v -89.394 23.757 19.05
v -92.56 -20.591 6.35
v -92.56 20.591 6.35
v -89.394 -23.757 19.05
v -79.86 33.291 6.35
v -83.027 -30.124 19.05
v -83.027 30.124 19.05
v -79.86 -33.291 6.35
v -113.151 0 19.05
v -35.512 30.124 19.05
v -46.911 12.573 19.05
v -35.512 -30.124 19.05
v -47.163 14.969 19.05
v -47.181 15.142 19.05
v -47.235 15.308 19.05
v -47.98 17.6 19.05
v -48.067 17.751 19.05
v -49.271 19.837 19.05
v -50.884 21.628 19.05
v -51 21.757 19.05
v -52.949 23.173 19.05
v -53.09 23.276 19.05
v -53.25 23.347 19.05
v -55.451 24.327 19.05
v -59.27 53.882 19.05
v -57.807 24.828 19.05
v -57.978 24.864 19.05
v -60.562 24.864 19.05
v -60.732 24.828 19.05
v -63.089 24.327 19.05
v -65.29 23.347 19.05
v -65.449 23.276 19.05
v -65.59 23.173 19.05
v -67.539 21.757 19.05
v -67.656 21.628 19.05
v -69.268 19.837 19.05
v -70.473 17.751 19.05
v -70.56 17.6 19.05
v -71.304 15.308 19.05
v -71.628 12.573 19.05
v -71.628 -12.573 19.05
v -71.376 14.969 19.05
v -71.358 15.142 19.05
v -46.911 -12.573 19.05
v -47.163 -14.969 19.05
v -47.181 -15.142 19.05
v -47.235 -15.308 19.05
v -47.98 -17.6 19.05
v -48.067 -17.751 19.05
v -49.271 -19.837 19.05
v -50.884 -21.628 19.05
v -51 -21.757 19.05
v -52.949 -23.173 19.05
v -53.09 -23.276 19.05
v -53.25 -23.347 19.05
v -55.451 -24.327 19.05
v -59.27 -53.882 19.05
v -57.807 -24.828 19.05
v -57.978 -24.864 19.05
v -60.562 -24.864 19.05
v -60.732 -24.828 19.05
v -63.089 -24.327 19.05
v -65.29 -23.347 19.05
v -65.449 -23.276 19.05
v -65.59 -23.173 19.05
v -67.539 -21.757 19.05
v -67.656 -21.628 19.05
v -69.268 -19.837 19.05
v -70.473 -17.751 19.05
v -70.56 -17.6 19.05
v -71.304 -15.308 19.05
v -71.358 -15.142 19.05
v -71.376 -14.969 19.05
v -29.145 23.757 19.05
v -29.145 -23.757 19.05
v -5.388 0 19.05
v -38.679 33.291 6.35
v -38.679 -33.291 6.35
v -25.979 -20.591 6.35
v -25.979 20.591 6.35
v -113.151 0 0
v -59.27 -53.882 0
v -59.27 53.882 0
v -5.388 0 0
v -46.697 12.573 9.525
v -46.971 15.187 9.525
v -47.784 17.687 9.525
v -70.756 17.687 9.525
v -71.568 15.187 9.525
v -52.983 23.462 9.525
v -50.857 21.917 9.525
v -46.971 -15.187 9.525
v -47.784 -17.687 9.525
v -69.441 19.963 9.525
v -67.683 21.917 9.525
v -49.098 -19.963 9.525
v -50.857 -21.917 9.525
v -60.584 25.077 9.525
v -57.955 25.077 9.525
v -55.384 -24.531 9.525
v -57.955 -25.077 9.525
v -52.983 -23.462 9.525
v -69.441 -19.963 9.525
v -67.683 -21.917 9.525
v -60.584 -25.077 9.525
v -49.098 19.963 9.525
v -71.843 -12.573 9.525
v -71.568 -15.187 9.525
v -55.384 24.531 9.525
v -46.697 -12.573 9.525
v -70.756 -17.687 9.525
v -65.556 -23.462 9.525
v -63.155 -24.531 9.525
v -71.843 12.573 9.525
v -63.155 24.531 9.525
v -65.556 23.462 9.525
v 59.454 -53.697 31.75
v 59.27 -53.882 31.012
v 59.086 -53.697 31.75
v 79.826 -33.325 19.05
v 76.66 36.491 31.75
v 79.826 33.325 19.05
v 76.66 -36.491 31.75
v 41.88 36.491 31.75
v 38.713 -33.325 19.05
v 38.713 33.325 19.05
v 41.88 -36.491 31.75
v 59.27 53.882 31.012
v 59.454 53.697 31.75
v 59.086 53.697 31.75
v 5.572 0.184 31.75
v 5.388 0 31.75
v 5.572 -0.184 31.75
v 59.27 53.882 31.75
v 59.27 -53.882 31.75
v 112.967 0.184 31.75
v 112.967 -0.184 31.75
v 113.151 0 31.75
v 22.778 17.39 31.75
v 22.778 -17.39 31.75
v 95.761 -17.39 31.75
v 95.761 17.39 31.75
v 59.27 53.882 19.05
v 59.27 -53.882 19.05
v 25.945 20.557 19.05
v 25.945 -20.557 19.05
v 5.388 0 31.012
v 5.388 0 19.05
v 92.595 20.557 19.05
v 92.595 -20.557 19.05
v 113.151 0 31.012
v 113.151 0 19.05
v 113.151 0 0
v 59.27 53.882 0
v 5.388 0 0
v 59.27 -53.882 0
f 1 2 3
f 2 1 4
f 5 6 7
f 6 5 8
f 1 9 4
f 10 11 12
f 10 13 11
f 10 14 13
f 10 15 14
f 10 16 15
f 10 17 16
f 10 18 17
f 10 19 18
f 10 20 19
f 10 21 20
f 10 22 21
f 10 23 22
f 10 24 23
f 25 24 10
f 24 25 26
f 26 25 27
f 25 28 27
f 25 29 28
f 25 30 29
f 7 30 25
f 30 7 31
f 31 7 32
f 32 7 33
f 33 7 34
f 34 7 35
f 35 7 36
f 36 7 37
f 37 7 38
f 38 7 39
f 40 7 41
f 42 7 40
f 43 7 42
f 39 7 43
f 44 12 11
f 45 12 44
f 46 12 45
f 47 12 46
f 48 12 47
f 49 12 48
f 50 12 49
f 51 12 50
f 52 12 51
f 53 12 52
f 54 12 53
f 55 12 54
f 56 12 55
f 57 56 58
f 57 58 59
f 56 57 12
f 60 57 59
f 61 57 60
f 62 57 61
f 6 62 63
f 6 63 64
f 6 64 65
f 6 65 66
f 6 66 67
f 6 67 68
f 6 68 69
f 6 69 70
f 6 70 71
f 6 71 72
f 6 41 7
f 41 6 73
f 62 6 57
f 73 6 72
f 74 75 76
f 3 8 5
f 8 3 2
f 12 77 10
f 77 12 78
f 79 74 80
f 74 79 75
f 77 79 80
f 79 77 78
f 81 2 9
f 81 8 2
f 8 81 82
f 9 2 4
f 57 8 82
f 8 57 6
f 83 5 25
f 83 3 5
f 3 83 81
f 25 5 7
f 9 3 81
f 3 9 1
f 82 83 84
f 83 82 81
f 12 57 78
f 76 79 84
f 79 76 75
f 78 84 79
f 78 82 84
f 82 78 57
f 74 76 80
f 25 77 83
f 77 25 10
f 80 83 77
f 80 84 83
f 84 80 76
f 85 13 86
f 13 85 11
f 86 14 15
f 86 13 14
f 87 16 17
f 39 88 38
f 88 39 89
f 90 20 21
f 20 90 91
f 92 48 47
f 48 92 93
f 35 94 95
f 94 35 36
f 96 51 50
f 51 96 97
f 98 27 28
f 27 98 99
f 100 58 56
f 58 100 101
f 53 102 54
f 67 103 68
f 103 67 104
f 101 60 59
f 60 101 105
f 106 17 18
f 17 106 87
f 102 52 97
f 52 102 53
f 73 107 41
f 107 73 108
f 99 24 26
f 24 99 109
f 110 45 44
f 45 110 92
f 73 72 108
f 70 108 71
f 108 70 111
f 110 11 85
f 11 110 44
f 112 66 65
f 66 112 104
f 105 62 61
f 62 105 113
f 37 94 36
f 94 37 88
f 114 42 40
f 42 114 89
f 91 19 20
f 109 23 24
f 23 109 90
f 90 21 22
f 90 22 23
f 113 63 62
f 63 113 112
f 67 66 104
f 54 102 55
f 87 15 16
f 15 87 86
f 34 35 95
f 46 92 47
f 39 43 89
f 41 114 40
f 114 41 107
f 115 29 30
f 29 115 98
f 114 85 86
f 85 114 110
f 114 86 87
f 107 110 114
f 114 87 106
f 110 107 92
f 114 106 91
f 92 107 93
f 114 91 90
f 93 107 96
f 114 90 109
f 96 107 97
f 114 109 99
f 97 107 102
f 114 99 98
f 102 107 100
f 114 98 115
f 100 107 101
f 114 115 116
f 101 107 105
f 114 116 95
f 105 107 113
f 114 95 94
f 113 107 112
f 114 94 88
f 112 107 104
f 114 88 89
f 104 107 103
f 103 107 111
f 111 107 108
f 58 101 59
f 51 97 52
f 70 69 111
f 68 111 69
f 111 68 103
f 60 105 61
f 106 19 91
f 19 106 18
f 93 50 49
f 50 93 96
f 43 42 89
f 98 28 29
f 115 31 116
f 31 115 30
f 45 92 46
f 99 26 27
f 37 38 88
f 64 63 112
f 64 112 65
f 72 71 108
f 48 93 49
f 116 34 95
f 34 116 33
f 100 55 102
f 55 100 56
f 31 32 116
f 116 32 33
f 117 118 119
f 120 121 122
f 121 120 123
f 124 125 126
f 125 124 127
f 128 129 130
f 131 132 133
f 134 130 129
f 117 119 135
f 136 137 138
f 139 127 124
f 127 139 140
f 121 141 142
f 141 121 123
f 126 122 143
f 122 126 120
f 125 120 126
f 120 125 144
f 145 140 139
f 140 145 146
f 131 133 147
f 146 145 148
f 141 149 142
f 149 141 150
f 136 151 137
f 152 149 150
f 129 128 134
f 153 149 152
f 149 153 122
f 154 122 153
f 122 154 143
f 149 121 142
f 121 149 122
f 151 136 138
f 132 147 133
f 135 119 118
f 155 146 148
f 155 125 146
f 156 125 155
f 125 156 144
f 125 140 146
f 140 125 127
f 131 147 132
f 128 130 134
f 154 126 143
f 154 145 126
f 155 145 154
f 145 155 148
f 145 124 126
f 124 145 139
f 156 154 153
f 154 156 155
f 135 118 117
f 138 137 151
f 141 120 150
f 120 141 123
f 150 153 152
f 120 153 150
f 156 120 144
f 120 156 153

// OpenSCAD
//!OpenSCAD

Height = 1.5;
Width_and_Depth = 3;
Number_of_Tails = 1;
Units = 25.4;
Dovetail_Angle = 14;
Dovetail_Height = 0.5;
Dovetail_Diameter = 0.5;
Box_Proportion = 0.5;
Hole_Proportion = 0.33;
Generate_DXF_or_STL = "STL"; // [DXF, STL]
Open_or_Closed = "Open"; // [Open, Closed]

module makebottom() {
  difference() {
    translate([0, 0, ((ht * Box_Proportion) / 2)]){
      rotate([0, 0, 45]){
        cube([wd, wd, (ht * Box_Proportion)], center=true);
      }
    }

    cutbottomdovetails();
    cutpocket();
  }
}

ht = Height * Units;
wd = Width_and_Depth * Units;
dh = Dovetail_Height * Units;
dr = (Dovetail_Diameter * Units) / 2;
do = tan(Dovetail_Angle) * dh;
sd = dr - do;
rwidth = sqrt(wd * wd + wd * wd);
rwidthhalf = rwidth / 2;
rwidthquarter = rwidth / 4;
//item = 0;


module cutbottomdovetails() {
  union(){
    cutdovetails(-rwidthquarter, -(rwidthquarter * 1.5), ht * Box_Proportion - dh, -rwidthquarter, rwidthquarter * 1.5, ht * Box_Proportion - dh);
    cutdovetails(rwidthquarter, -(rwidthquarter * 1.5), ht * Box_Proportion - dh, rwidthquarter, rwidthquarter * 1.5, ht * Box_Proportion - dh);
  }
}

module cutdovetails(bx, by, bz, ex, ey, ez) {
  hull(){
    translate([bx, by, bz]){
      dovetail();
    }
    translate([ex, ey, ez]){
      dovetail();
    }
  }
}

module maketop() {
  color([0.6,0.4,0.2]) {
    difference() {
      translate([0, 0, (((ht - ht * Box_Proportion) + dh) / 2)]){
        rotate([0, 0, 45]){
          cube([wd, wd, ((ht - ht * Box_Proportion) + dh)], center=true);
        }
      }

      cuttopdovetails();
    }
  }
}

module cuttopdovetails() {
  union(){
    hull(){
      cutdovetails(-(rwidthquarter - sd * 4), -(rwidthquarter * 1.875), ht * Box_Proportion, -(rwidthquarter - sd * 4), rwidthquarter * 1.875, ht * Box_Proportion);
      cutdovetails(rwidthquarter - sd * 4, -(rwidthquarter * 1.875), ht * Box_Proportion, rwidthquarter - sd * 4, rwidthquarter * 1.875, ht * Box_Proportion);
    }
    hull(){
      cutdovetails(-(rwidthquarter + sd * 4), -rwidthquarter, ht * Box_Proportion, -(rwidthquarter + sd * 4), rwidthquarter, ht * Box_Proportion);
      cutdovetails(-(rwidthquarter * 1.875), -rwidthquarter, ht * Box_Proportion, -(rwidthquarter * 1.875), rwidthquarter, ht * Box_Proportion);
    }
    hull(){
      cutdovetails(rwidthquarter + sd * 4, -rwidthquarter, ht * Box_Proportion, rwidthquarter + sd * 4, rwidthquarter, ht * Box_Proportion);
      cutdovetails(rwidthquarter * 1.875, -rwidthquarter, ht * Box_Proportion, rwidthquarter * 1.875, rwidthquarter, ht * Box_Proportion);
    }
  }
}

module cutpocket() {
  hull(){
    translate([0, ((wd * Hole_Proportion) / 2), (ht / 4)]){
      cylinder(r1=((wd * Hole_Proportion) / 2), r2=10, h=(ht * 3), center=false);
    }
    translate([0, (-((wd * Hole_Proportion) / 2)), (ht / 4)]){
      cylinder(r1=((wd * Hole_Proportion) / 2), r2=10, h=(ht * 3), center=false);
    }
  }
}

module dovetail() {
  if (Generate_DXF_or_STL == "STL") {
    union(){
      cylinder(r1=dr, r2=(dr - do), h=dh, center=false);
    }
  } else {
    translate([0, 0, (-ht)]){
      cylinder(r1=(dr - do), r2=(dr - do), h=(ht * 3), center=false);
    }
  }

}

if (Generate_DXF_or_STL == "STL") {
  if (Open_or_Closed == "Open") {
    union(){
      translate([(-(rwidthhalf * 1.1)), 0, 0]){
        makebottom();
      }
      translate([(rwidthhalf * 1.1), 0, 0]){
        maketop();
      }
    }
  } else {
    union(){
      makebottom();
      translate([0, 0, ht]){
        rotate([0, 180, 0]){
          maketop();
        }
      }
    }
  }

} else {
  union(){
    translate([(-(rwidthhalf * 1.1)), 0, 0]){
      union(){
        difference() {
          cube([rwidth, rwidth, (ht * 0.1)], center=true);

          rotate([0, 0, 45]){
            cube([wd, wd, ((ht - ht * Box_Proportion) + dh)], center=true);
          }
        }
        intersection() {
          rotate([0, 0, 45]){
            cube([wd, wd, (ht * 0.1)], center=true);
          }

          translate([0, 0, (-ht)]){
            cutpocket();
          }

        }
      }
    }
    translate([(rwidthhalf * 1.1), 0, 0]){
      difference() {
        cube([rwidth, rwidth, (ht * 0.1)], center=true);

        cutbottomdovetails();
      }
    }
    translate([(rwidthhalf * 3.3), 0, 0]){
      difference() {
        cube([rwidth, rwidth, (ht * 0.1)], center=true);

        cuttopdovetails();
      }
    }
  }
}
